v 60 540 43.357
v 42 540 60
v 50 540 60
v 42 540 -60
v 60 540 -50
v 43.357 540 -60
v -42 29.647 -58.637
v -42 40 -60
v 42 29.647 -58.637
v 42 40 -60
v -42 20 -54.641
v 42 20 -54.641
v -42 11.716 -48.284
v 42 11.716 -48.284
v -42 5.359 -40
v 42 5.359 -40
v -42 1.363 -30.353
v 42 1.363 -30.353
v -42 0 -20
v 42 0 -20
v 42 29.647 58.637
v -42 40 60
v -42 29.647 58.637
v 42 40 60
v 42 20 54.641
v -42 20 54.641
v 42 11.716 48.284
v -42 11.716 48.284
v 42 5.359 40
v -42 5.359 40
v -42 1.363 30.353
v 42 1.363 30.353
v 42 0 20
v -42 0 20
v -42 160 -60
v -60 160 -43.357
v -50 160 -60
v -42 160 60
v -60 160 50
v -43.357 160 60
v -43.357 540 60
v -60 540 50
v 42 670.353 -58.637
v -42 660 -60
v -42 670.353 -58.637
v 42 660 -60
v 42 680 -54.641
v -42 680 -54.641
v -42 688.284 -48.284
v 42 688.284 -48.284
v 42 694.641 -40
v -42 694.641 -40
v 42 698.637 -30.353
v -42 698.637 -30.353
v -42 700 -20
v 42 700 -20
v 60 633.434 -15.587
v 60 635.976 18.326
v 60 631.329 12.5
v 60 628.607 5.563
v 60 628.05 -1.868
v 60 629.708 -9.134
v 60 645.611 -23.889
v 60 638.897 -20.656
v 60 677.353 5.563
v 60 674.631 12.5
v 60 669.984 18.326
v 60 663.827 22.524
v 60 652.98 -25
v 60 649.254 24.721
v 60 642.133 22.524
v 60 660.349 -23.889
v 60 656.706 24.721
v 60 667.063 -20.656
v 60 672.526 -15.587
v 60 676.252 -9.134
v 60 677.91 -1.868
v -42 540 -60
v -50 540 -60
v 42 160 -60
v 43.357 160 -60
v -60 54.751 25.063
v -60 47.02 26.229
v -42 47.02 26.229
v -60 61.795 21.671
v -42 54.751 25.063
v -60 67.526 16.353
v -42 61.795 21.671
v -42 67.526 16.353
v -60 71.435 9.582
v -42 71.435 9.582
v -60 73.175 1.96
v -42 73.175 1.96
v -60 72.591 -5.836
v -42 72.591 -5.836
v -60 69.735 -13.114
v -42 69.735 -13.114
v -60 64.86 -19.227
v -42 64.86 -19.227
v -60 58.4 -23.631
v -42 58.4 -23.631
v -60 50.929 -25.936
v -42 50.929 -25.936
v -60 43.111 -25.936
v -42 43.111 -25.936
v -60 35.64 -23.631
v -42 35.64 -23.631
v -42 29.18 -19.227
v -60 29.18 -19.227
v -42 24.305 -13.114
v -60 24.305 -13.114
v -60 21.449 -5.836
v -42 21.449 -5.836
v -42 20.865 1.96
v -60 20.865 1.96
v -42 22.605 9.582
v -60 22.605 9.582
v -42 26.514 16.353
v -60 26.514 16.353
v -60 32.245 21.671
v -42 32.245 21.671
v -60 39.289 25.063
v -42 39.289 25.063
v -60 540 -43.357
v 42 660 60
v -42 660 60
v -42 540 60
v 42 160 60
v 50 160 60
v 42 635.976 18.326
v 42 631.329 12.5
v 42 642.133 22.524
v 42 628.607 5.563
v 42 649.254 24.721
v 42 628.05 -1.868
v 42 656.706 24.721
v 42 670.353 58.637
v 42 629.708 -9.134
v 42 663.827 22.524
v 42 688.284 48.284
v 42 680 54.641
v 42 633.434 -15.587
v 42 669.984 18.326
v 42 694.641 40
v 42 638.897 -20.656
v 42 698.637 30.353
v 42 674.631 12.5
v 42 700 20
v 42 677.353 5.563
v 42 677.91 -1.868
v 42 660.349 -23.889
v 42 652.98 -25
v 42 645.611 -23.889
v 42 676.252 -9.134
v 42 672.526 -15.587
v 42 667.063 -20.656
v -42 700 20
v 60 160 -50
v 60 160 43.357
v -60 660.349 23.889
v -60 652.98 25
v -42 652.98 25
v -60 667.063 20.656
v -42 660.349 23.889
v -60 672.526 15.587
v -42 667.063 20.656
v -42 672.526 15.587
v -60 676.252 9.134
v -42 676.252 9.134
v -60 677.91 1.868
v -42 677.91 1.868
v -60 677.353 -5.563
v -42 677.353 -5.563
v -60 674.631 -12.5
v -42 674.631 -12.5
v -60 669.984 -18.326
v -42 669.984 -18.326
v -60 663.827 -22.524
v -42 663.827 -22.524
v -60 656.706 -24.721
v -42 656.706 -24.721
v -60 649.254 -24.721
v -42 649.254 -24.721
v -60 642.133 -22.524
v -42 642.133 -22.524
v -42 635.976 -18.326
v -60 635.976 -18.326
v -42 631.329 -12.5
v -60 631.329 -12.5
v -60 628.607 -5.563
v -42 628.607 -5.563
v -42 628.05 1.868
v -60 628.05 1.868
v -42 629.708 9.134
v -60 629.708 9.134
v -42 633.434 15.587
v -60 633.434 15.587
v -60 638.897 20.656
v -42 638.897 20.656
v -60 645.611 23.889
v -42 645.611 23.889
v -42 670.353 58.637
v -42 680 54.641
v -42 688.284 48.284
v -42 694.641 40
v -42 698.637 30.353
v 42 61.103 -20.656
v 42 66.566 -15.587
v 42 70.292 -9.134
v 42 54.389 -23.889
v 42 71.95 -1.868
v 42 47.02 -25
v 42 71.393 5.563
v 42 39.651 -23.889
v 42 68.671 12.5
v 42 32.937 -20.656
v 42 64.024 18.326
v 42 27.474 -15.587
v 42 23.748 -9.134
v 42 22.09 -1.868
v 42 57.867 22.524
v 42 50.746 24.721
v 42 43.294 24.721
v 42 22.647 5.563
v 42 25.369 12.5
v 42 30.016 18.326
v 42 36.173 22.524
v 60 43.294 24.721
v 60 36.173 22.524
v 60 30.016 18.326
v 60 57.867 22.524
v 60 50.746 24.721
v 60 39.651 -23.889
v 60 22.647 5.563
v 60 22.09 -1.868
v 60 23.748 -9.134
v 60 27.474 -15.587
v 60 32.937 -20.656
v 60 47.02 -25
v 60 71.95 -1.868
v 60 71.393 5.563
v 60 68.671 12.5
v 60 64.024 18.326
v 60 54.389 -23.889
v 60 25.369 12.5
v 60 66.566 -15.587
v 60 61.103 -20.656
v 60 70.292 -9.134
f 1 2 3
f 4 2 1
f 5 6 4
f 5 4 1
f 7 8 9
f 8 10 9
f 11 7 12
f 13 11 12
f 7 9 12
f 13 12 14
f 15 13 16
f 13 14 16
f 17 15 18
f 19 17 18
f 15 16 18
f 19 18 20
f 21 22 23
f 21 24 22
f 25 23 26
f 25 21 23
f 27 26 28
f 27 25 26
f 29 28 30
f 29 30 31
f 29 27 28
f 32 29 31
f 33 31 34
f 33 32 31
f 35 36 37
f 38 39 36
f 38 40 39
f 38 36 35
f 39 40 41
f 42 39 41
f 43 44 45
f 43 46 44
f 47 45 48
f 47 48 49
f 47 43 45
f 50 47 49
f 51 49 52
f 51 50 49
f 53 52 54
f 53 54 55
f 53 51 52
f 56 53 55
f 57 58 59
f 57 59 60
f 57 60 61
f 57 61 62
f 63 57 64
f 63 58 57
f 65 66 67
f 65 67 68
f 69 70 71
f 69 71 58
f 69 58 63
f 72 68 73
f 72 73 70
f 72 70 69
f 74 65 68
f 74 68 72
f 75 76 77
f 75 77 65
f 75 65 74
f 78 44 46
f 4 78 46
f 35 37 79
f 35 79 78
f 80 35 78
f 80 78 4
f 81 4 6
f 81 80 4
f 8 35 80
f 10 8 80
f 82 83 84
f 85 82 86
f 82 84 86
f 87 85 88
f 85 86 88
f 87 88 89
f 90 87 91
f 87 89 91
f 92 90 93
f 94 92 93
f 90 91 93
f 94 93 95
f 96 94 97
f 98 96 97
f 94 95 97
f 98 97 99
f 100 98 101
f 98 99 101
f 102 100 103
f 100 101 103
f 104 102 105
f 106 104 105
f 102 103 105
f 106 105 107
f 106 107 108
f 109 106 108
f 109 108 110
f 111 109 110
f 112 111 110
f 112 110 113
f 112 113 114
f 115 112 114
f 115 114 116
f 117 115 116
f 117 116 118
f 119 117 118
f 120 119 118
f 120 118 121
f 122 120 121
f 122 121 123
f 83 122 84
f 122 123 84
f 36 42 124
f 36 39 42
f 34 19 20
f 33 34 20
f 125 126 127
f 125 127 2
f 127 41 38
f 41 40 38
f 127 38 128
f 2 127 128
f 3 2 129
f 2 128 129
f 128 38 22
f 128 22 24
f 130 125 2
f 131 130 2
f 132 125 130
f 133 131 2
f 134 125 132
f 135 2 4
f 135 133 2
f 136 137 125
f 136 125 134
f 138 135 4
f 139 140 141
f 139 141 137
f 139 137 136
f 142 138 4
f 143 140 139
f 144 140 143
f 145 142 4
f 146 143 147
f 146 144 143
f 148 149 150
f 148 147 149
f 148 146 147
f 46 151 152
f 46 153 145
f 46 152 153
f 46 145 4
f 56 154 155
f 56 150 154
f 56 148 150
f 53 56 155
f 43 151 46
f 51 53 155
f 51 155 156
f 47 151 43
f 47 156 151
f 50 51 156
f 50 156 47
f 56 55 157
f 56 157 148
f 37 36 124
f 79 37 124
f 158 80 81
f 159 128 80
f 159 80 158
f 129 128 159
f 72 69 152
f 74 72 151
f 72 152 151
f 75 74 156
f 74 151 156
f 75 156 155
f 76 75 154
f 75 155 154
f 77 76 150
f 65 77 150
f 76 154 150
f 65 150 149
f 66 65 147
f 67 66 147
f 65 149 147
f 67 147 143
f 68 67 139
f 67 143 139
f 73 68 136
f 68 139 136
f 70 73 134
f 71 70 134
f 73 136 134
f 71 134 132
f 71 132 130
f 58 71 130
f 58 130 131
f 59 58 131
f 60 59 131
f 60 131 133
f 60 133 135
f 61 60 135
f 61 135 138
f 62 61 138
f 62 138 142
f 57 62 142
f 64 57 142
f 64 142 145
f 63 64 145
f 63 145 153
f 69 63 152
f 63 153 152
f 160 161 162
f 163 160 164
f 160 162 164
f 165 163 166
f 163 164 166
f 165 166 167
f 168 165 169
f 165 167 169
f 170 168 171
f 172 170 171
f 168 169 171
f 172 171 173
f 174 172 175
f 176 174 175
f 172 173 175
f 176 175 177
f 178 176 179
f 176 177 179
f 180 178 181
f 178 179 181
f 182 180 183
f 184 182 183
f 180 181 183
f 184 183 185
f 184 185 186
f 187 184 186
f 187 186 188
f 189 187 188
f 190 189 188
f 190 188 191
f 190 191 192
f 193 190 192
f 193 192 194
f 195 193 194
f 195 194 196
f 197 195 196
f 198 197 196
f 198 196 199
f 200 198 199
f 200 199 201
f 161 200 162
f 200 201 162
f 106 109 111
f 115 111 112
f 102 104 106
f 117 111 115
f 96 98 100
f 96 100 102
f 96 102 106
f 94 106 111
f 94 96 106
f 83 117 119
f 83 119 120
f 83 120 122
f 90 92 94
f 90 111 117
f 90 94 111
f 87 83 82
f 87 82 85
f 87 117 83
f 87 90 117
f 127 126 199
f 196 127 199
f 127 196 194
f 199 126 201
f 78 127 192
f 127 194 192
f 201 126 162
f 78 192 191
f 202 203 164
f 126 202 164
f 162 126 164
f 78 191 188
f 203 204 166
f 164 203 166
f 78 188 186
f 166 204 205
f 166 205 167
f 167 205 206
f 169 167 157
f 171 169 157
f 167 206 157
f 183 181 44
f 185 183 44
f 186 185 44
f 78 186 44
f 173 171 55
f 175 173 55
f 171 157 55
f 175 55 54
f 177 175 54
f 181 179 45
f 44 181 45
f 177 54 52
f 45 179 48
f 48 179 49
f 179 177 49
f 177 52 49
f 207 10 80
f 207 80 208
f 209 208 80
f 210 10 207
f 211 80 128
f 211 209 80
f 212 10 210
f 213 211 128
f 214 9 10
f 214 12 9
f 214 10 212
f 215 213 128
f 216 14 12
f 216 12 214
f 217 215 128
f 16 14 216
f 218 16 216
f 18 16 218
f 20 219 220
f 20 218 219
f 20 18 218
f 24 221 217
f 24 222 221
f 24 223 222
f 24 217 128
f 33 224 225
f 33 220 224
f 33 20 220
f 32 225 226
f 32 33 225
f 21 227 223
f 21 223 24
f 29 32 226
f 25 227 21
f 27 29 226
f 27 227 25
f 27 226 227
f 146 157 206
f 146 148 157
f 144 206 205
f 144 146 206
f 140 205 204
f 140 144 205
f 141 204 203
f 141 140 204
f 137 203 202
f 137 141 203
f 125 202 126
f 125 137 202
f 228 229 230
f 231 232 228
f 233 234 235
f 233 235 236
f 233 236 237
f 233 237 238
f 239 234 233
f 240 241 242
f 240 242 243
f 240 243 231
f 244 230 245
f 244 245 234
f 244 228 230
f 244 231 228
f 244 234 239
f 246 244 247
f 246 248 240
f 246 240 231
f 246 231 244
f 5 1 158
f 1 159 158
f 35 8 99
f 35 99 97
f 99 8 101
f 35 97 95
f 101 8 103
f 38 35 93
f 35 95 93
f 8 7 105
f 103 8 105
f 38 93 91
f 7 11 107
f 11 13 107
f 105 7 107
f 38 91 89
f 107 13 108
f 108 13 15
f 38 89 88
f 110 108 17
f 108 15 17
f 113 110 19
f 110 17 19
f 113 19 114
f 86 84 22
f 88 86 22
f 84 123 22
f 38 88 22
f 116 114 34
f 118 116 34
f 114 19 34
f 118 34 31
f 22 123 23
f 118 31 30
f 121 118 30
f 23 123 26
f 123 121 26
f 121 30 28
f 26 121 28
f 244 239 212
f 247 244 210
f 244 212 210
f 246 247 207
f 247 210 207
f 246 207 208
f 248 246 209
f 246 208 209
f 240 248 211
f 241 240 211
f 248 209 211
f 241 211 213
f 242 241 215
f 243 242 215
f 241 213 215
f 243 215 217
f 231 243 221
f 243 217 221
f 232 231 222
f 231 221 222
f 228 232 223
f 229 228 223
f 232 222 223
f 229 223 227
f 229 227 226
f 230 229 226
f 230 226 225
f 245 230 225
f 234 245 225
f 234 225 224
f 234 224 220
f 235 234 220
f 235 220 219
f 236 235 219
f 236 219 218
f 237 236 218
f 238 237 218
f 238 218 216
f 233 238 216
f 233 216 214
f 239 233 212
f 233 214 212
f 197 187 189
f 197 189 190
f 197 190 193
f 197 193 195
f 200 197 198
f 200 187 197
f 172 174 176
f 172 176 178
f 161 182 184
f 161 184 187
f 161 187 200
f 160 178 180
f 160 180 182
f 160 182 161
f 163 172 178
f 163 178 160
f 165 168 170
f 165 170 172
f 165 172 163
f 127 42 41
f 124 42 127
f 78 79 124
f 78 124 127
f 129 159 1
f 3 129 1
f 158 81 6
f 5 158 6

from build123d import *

# Parameters (mm, degrees)
SKETCH1_W             = 120
SKETCH1_H             = 120
BOSS_EXTRUDE1_DEPTH   = 700
SKETCH2_W             = 18
SKETCH2_H             = 120
CUT_EXTRUDE1_DEPTH    = 160
SKETCH3_R             = 26.228524845
BOSS_EXTRUDE2_DEPTH   = 18
SKETCH4_R             = 25
BOSS_EXTRUDE3_DEPTH   = 18
FILLET1_R             = 40
SKETCH5_W             = 18
SKETCH5_H             = 120
CUT_EXTRUDE2_DEPTH    = 160
SKETCH6_R             = 25
BOSS_EXTRUDE5_DEPTH   = 18
SKETCH7_R             = 25
BOSS_EXTRUDE6_DEPTH   = 18
FILLET2_R             = 40
CHAMFER1_SIZE         = 10
CHAMFER1_SIZE2        = 16.642794824
CHAMFER1_PART_2_SIZE  = 10
CHAMFER1_PART_2_SIZE2 = 16.642794824
CHAMFER1_PART_3_SIZE  = 10
CHAMFER1_PART_3_SIZE2 = 16.642794824
CHAMFER1_PART_4_SIZE  = 10
CHAMFER1_PART_4_SIZE2 = 16.642794824


with BuildPart() as part:
    # Sketch1 → Boss-Extrude1 (new body)
    with BuildSketch(Plane(origin=(0, 0, 0), x_dir=(1, 0, 0), z_dir=(0, 1, 0))):
        Rectangle(SKETCH1_W, SKETCH1_H)
    extrude(amount=BOSS_EXTRUDE1_DEPTH)

    # Sketch2 → Cut-Extrude1 (cut)
    with BuildSketch(Plane.XZ):
        with Locations((-51, 0)):
            Rectangle(SKETCH2_W, SKETCH2_H)
        with Locations((51, 0)):
            Rectangle(SKETCH2_W, SKETCH2_H)
    extrude(amount=-CUT_EXTRUDE1_DEPTH, mode=Mode.SUBTRACT)

    # Sketch3 → Boss-Extrude2 (add)
    with BuildSketch(Plane.ZY.offset(42)):
        with Locations((0, 47.02)):
            Circle(SKETCH3_R)
    extrude(amount=BOSS_EXTRUDE2_DEPTH)

    # Sketch4 → Boss-Extrude3 (add)
    with BuildSketch(Plane(origin=(42, 0, 0), x_dir=(0, 0, -1), z_dir=(1, 0, 0))):
        with Locations((0, 47.02)):
            Circle(SKETCH4_R)
    extrude(amount=BOSS_EXTRUDE3_DEPTH)

    # Fillet1
    fillet1_edges = [part.edges().sort_by_distance(p)[0] for p in [
        (0, 0, 60),
        (0, 0, -60),
    ]]
    fillet(fillet1_edges, radius=FILLET1_R)

    # Sketch5 → Cut-Extrude2 (cut)
    with BuildSketch(Plane(origin=(0, 700, 0), x_dir=(1, 0, 0), z_dir=(0, 1, 0))):
        with Locations((-51, 0)):
            Rectangle(SKETCH5_W, SKETCH5_H)
        with Locations((51, 0)):
            Rectangle(SKETCH5_W, SKETCH5_H)
    extrude(amount=-CUT_EXTRUDE2_DEPTH, mode=Mode.SUBTRACT)

    # Sketch6 → Boss-Extrude5 (add)
    with BuildSketch(Plane.ZY.offset(42)):
        with Locations((0, 652.98)):
            Circle(SKETCH6_R)
    extrude(amount=BOSS_EXTRUDE5_DEPTH)

    # Sketch7 → Boss-Extrude6 (add)
    with BuildSketch(Plane(origin=(42, 0, 0), x_dir=(0, 0, -1), z_dir=(1, 0, 0))):
        with Locations((0, 652.98)):
            Circle(SKETCH7_R)
    extrude(amount=BOSS_EXTRUDE6_DEPTH)

    # Fillet2
    fillet2_edges = [part.edges().sort_by_distance(p)[0] for p in [
        (0, 700, -60),
        (0, 700, 60),
    ]]
    fillet(fillet2_edges, radius=FILLET2_R)

    # Chamfer1
    chamfer1_edges = [part.edges().sort_by_distance(p)[0] for p in [
        (60, 350, 60),
    ]]
    chamfer1_side = [part.faces().sort_by_distance(p)[0] for p in [
        (0, 350, 60),
    ]]
    chamfer(chamfer1_edges, length=CHAMFER1_SIZE, length2=CHAMFER1_SIZE2, reference=chamfer1_side[0])

    # Chamfer1 part 2
    chamfer1_part_2_edges = [part.edges().sort_by_distance(p)[0] for p in [
        (-60, 350, 60),
    ]]
    chamfer1_part_2_side = [part.faces().sort_by_distance(p)[0] for p in [
        (-60, 350, 0),
    ]]
    chamfer(chamfer1_part_2_edges, length=CHAMFER1_PART_2_SIZE, length2=CHAMFER1_PART_2_SIZE2, reference=chamfer1_part_2_side[0])

    # Chamfer1 part 3
    chamfer1_part_3_edges = [part.edges().sort_by_distance(p)[0] for p in [
        (-60, 350, -60),
    ]]
    chamfer1_part_3_side = [part.faces().sort_by_distance(p)[0] for p in [
        (0, 350, -60),
    ]]
    chamfer(chamfer1_part_3_edges, length=CHAMFER1_PART_3_SIZE, length2=CHAMFER1_PART_3_SIZE2, reference=chamfer1_part_3_side[0])

    # Chamfer1 part 4
    chamfer1_part_4_edges = [part.edges().sort_by_distance(p)[0] for p in [
        (60, 350, -60),
    ]]
    chamfer1_part_4_side = [part.faces().sort_by_distance(p)[0] for p in [
        (60, 350, 0),
    ]]
    chamfer(chamfer1_part_4_edges, length=CHAMFER1_PART_4_SIZE, length2=CHAMFER1_PART_4_SIZE2, reference=chamfer1_part_4_side[0])


solid = part.part
